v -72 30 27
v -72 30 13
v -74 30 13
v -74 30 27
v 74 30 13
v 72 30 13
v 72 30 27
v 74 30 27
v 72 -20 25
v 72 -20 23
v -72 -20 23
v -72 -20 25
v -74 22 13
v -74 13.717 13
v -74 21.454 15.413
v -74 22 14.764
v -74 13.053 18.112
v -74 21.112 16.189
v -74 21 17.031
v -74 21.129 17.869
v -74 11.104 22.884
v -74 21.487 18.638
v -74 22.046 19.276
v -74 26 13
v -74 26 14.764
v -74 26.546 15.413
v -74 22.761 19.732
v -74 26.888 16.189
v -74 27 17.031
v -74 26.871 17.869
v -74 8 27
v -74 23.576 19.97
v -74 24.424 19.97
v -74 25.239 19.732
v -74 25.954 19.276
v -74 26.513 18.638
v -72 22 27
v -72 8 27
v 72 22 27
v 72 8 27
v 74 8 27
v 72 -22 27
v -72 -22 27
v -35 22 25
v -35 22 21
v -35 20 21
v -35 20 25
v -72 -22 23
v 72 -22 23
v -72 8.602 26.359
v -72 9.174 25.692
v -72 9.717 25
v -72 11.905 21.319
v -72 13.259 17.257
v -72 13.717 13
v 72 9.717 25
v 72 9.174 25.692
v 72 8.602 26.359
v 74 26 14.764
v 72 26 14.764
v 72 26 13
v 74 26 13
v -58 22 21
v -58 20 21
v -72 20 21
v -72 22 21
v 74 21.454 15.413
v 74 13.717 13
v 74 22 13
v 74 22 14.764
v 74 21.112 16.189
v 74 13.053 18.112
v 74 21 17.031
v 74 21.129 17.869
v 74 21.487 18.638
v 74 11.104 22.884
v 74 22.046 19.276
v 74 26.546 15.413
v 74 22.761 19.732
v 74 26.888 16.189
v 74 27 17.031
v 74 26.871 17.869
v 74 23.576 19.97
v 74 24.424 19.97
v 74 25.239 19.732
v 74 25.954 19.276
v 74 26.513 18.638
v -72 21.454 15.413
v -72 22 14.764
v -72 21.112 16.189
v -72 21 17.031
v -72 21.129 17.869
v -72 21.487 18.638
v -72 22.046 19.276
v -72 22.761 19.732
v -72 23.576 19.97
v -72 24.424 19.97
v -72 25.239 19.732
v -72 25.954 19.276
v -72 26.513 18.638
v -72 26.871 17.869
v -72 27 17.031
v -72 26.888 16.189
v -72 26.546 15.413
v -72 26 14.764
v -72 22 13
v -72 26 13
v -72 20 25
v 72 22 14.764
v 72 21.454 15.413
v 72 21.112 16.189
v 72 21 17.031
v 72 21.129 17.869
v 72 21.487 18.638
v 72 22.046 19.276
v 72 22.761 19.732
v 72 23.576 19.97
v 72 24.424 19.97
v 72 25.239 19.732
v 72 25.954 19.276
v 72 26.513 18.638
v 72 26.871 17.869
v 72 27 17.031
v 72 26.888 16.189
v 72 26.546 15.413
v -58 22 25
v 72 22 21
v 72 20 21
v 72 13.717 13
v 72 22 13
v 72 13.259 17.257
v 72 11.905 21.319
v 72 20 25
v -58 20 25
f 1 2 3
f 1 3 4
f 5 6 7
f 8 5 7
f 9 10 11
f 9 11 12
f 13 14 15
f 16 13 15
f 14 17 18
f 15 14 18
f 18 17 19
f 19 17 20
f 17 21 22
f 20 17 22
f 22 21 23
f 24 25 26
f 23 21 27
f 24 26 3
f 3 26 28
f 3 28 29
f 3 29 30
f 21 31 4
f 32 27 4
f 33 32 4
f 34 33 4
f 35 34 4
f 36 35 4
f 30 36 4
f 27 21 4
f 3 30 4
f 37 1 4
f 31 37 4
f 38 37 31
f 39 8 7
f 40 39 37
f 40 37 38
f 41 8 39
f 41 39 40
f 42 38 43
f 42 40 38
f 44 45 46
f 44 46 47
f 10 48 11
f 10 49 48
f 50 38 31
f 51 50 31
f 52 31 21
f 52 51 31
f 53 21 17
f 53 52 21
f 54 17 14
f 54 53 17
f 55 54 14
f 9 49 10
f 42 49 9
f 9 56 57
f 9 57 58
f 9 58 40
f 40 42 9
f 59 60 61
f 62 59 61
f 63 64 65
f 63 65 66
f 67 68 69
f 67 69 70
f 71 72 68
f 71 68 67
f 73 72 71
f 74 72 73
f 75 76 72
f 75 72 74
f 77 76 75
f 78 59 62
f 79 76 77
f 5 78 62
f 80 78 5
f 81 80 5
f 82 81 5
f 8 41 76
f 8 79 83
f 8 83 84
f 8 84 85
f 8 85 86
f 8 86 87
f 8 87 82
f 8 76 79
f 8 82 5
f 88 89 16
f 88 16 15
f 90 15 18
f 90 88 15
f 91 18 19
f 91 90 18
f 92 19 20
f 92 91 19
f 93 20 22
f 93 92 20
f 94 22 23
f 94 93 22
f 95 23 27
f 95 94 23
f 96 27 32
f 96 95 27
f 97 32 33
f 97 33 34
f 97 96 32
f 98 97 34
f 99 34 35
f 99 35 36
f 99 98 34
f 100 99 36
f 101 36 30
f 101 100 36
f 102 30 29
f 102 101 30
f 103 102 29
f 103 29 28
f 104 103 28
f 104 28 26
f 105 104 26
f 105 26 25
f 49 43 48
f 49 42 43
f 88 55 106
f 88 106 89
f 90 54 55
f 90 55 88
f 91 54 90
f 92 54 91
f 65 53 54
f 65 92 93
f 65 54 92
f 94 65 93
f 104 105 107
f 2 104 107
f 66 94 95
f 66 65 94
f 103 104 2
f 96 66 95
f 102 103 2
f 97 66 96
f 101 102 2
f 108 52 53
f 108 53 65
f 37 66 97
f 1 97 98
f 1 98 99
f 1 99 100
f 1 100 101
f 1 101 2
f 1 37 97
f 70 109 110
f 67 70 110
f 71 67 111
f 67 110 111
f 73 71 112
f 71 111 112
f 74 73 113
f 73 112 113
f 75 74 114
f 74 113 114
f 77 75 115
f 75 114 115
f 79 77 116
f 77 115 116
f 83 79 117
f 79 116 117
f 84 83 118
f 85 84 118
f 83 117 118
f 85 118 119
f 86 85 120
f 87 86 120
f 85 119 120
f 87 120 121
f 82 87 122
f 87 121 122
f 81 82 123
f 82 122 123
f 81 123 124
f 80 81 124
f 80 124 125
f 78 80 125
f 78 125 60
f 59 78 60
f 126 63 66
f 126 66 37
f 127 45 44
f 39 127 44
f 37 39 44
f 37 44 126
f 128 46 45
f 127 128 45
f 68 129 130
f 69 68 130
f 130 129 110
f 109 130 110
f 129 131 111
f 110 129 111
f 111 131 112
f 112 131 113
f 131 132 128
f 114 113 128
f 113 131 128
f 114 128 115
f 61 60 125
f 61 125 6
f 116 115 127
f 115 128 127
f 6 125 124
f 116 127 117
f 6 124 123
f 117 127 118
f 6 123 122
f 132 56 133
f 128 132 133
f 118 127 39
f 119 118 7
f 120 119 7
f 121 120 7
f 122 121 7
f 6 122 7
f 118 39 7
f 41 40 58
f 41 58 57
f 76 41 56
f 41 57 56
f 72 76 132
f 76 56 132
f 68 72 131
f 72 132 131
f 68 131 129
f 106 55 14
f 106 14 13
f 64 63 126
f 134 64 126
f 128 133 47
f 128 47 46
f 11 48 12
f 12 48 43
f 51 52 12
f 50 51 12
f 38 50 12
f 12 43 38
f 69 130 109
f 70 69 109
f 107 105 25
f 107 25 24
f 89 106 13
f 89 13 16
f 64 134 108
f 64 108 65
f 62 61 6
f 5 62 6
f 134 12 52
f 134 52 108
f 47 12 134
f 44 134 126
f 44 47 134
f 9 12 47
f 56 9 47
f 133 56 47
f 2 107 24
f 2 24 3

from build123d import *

# Parameters (mm, degrees)
F1_DEPTH = 72
F3_DEPTH = 2
F4_W     = 23
F4_H     = 4
F5_DEPTH = 25


# Not quite as in the source:
# - a pattern or mirror of a feature is missing from the dataset's text; its kind, count and spacing are read off the source's solid


with BuildPart() as f1:
    # F0 (on Right) → F1 (new body, symmetric)
    with BuildSketch(Plane.YZ):
        Polygon((-22, 23), (-20, 23), (-20, 25), (20, 25), (20, 21), (22, 21), (22, 27), (-22, 27), align=None)
    extrude(amount=F1_DEPTH, both=True)

    # F2 (on face) → F3 (join)
    with BuildSketch(Plane.YZ.offset(72)):
        with BuildLine():
            Line((30, 27), (22, 27))
            Line((22, 27), (8, 27))
            ThreePointArc((8, 27), (12.2327735284, 20.5611792354), (13.7171431429, 13))
            Line((13.7171431429, 13), (22, 13))
            Line((22, 13), (22, 14.7639320225))
            ThreePointArc((22, 14.7639320225), (24, 20), (26, 14.7639320225))
            Line((26, 14.7639320225), (26, 13))
            Line((26, 13), (30, 13))
            Line((30, 13), (30, 27))
        make_face()
    f3 = extrude(amount=F3_DEPTH)

    # F3_copies: F3 across plane
    add(f3.mirror(Plane(origin=(0, 0, 0), x_dir=(0, 0, -1), z_dir=(-1, 0, 0))))

    # F4 (on face) → F5 (cut)
    with BuildSketch(Plane(origin=(0, 22, 0), x_dir=(-1, 0, 0), z_dir=(0, 1, 0))):
        with Locations((46.5, 23)):
            Rectangle(F4_W, F4_H)
    extrude(amount=-F5_DEPTH, mode=Mode.SUBTRACT)


solid = f1.part
